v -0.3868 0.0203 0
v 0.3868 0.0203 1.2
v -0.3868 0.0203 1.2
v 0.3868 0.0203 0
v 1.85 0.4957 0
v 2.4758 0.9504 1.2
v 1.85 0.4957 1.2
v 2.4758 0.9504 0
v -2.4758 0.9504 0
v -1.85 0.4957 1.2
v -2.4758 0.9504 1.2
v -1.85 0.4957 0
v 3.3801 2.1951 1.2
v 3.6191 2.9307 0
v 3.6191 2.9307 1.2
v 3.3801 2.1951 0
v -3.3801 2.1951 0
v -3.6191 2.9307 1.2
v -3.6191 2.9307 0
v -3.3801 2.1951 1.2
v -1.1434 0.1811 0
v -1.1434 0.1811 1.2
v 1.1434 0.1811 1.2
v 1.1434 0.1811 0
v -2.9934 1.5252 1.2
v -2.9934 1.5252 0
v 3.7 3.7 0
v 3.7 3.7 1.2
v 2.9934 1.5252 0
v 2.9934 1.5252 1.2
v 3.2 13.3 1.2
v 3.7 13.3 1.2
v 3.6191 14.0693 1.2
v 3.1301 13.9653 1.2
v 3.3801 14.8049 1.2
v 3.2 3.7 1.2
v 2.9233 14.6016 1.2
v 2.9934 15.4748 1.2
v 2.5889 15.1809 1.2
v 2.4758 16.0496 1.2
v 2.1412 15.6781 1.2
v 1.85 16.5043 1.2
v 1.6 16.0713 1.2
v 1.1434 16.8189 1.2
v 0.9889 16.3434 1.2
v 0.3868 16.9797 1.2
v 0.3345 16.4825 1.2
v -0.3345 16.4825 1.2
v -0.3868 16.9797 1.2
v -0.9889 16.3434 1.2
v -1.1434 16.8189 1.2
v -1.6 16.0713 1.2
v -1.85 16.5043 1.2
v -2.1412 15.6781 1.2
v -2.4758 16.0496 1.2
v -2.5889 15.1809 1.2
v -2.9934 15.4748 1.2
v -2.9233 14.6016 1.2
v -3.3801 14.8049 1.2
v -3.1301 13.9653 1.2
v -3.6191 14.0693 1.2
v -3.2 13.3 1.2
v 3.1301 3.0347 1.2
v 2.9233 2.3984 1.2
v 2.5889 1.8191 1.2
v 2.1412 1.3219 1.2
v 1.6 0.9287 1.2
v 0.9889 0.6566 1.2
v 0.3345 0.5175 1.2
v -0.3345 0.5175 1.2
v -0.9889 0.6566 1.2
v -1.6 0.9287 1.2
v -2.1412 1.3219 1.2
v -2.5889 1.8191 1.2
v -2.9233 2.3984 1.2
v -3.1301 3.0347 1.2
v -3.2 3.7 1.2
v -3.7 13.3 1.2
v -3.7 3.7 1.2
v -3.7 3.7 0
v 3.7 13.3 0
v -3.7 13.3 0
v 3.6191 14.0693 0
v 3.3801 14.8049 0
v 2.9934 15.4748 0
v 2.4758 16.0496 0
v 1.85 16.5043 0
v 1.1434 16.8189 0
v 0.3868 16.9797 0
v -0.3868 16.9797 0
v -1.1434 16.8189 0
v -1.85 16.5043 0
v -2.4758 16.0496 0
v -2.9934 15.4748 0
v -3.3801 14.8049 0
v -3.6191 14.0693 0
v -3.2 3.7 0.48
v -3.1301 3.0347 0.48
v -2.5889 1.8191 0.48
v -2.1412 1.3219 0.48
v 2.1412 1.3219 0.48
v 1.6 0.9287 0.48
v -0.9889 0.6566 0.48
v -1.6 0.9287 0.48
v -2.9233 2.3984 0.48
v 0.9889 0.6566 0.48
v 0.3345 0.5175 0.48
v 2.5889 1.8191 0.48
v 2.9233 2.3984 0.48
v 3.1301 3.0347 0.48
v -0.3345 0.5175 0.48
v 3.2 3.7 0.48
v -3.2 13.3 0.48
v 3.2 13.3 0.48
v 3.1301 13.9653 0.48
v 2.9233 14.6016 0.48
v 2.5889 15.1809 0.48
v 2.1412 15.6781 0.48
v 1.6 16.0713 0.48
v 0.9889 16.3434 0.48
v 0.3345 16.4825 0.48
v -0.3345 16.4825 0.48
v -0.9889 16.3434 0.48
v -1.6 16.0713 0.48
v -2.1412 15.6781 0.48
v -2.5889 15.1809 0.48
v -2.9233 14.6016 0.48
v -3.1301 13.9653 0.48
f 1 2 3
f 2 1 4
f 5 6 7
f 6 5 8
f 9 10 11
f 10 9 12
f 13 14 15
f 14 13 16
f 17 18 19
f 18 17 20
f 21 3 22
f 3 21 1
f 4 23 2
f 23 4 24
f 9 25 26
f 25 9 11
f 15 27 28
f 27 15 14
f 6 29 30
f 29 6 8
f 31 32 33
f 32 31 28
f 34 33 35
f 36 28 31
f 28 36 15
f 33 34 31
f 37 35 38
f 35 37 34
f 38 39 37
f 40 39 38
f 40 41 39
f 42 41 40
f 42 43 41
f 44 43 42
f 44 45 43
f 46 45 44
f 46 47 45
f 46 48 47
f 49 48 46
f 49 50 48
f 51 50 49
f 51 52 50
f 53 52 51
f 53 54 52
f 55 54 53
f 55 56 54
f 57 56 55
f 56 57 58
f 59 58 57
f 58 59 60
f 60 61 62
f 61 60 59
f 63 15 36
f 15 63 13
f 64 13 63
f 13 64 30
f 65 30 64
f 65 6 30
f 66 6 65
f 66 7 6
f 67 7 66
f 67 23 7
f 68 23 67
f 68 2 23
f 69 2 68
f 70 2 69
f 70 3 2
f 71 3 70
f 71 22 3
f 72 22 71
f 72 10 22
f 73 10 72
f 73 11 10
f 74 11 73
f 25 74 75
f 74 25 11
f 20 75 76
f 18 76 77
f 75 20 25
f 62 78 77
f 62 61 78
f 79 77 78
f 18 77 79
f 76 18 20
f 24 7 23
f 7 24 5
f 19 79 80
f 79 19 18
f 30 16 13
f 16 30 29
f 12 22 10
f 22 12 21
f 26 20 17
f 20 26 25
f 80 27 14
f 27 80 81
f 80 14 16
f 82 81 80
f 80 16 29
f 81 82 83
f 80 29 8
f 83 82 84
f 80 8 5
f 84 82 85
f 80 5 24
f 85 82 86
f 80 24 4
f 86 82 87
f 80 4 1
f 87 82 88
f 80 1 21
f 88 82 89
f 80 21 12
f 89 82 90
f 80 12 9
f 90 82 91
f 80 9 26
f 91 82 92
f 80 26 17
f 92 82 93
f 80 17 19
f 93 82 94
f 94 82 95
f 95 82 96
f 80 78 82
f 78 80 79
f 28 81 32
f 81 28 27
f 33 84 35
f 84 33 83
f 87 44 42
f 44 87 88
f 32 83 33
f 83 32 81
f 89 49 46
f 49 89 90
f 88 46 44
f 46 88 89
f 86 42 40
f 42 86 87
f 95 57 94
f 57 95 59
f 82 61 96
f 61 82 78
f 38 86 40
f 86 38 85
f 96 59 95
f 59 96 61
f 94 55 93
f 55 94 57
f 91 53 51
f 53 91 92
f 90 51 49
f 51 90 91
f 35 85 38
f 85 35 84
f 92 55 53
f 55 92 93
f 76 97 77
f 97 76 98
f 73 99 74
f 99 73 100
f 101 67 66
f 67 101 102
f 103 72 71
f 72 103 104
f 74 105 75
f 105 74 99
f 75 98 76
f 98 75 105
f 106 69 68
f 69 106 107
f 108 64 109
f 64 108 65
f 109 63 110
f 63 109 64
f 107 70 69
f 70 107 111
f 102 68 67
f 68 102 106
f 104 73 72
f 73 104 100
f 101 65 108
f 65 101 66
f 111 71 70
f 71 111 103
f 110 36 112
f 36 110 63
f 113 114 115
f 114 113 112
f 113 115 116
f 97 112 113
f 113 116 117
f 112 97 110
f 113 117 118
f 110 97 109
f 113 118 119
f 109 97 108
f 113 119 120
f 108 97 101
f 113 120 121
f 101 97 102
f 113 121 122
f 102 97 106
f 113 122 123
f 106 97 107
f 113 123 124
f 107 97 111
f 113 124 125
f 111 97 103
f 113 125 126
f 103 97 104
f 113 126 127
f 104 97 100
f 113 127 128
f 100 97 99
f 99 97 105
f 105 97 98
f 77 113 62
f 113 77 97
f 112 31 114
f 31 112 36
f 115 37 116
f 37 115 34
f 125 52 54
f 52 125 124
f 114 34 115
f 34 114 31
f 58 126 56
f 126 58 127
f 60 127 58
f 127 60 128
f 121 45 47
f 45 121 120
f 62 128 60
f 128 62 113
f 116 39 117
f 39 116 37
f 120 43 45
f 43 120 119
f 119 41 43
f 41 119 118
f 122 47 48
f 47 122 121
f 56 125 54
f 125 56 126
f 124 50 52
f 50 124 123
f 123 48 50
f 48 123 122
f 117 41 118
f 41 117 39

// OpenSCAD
//Cartouche designs

$fn=30 ;

layerHeight = 0.12 ;
shipType = "Khopeshii" ;

ship =  shipType == "Monolith" ? 0 :
        shipType == "War Galley" ? 1 : 
        shipType == "Khopeshii" ? 2 :
        shipType == "Dust Chaser" ? 3 :
        shipType == "Soul Hunter" ? 4 :
        shipType == "Slave Squadron"  ? 5 : -1
;  // ship = -1 for an incorrect shpType name

d = 0.50 ;
//Vessels
vessels = [0,1,2,3,4,5] ;   // 0: Monolith, 
                            // 1: War Galley, 
                            // 2: Khopeshii, 
                            // 3: Dust Chaser, 
                            // 4: Soul Hunter, 
                            // 5: Slave Squadron

cartoucheHeights = [0.00, 22.00, 17.00, 15.00, 0.00,  0.00] ;
cartoucheWidths  = [0.00,  9.60, 07.40, 06.50, 0.00,  0.00] ;

cartoucheH = cartoucheHeights[ship] ;
cartoucheW = cartoucheWidths[ship] ;

module cartouche_frame(r, h) {
    translate([0,r,0])  
        linear_extrude(10*layerHeight) circle(r) ;
    translate([-r,r,0]) 
        linear_extrude(10*layerHeight) square([r*2.0,h-2*r],center=false) ;
    translate([0,h-1.0*r,0]) 
        linear_extrude(10*layerHeight) circle(r) ;

}

module cartoucheFrame (r, h) {
    translate([0,0,0]) 
        difference() {
            translate([0,0,0])               cartouche_frame(r=r, h=h) ;
            translate([0,0.5,4*layerHeight]) cartouche_frame(r=r-0.5, h=h-1.0) ;
        }
} 


cartoucheFrame(r=cartoucheW/2, h=cartoucheH) ;
